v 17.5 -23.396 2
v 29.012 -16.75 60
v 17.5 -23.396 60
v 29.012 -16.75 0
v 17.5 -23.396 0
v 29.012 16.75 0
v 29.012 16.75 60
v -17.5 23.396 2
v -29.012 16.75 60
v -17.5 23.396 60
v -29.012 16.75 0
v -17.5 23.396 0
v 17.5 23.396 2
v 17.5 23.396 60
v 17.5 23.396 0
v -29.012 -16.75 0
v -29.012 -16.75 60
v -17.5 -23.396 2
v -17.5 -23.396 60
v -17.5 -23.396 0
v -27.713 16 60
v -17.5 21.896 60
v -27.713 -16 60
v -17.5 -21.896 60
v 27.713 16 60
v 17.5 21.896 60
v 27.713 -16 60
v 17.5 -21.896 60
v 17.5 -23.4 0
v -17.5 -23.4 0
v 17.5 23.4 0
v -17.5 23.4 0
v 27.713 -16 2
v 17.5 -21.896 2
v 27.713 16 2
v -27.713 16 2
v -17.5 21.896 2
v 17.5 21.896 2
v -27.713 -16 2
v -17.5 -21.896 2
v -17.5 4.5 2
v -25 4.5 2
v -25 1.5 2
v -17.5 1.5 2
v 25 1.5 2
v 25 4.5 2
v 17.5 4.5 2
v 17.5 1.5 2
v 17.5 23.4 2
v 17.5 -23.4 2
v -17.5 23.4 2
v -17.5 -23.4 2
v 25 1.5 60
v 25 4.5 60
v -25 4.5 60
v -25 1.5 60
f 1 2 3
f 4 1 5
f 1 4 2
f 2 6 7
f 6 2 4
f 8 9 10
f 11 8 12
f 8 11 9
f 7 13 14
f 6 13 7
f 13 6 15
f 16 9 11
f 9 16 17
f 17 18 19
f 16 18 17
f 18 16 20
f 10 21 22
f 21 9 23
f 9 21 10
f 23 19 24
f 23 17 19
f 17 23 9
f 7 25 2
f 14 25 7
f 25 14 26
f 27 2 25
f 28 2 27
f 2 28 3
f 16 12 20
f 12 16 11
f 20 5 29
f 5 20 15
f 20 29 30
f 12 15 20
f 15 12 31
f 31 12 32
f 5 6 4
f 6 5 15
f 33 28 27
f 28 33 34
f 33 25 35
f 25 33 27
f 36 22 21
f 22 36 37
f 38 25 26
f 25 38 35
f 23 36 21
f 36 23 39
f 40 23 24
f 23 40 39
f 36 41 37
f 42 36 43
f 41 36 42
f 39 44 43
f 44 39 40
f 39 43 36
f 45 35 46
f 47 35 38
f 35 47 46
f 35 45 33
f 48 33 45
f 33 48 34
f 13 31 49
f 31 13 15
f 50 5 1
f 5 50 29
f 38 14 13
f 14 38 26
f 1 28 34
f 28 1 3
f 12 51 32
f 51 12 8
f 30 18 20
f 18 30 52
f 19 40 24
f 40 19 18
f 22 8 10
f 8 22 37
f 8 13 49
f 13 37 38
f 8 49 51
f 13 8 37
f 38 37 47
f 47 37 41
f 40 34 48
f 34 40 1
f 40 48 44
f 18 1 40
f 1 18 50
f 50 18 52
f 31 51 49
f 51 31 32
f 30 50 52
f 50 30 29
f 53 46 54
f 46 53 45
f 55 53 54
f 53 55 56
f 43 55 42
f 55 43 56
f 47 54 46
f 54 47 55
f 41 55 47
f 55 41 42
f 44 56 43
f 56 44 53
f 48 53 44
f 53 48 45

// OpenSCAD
difference(){
    rotate([0,0,30])
    cylinder(d=67,h=60,$fn=6);
    rotate([0,0,30])translate([0,0,2])
    cylinder(d=64,h=65,$fn=6);
    translate([0,0,25])cube([35,70,72],center=true);
}

translate([0,0,1])
cube([35,46.8,2],center=true);

translate([0,3,30])
cube([50,3,60],center=true);
